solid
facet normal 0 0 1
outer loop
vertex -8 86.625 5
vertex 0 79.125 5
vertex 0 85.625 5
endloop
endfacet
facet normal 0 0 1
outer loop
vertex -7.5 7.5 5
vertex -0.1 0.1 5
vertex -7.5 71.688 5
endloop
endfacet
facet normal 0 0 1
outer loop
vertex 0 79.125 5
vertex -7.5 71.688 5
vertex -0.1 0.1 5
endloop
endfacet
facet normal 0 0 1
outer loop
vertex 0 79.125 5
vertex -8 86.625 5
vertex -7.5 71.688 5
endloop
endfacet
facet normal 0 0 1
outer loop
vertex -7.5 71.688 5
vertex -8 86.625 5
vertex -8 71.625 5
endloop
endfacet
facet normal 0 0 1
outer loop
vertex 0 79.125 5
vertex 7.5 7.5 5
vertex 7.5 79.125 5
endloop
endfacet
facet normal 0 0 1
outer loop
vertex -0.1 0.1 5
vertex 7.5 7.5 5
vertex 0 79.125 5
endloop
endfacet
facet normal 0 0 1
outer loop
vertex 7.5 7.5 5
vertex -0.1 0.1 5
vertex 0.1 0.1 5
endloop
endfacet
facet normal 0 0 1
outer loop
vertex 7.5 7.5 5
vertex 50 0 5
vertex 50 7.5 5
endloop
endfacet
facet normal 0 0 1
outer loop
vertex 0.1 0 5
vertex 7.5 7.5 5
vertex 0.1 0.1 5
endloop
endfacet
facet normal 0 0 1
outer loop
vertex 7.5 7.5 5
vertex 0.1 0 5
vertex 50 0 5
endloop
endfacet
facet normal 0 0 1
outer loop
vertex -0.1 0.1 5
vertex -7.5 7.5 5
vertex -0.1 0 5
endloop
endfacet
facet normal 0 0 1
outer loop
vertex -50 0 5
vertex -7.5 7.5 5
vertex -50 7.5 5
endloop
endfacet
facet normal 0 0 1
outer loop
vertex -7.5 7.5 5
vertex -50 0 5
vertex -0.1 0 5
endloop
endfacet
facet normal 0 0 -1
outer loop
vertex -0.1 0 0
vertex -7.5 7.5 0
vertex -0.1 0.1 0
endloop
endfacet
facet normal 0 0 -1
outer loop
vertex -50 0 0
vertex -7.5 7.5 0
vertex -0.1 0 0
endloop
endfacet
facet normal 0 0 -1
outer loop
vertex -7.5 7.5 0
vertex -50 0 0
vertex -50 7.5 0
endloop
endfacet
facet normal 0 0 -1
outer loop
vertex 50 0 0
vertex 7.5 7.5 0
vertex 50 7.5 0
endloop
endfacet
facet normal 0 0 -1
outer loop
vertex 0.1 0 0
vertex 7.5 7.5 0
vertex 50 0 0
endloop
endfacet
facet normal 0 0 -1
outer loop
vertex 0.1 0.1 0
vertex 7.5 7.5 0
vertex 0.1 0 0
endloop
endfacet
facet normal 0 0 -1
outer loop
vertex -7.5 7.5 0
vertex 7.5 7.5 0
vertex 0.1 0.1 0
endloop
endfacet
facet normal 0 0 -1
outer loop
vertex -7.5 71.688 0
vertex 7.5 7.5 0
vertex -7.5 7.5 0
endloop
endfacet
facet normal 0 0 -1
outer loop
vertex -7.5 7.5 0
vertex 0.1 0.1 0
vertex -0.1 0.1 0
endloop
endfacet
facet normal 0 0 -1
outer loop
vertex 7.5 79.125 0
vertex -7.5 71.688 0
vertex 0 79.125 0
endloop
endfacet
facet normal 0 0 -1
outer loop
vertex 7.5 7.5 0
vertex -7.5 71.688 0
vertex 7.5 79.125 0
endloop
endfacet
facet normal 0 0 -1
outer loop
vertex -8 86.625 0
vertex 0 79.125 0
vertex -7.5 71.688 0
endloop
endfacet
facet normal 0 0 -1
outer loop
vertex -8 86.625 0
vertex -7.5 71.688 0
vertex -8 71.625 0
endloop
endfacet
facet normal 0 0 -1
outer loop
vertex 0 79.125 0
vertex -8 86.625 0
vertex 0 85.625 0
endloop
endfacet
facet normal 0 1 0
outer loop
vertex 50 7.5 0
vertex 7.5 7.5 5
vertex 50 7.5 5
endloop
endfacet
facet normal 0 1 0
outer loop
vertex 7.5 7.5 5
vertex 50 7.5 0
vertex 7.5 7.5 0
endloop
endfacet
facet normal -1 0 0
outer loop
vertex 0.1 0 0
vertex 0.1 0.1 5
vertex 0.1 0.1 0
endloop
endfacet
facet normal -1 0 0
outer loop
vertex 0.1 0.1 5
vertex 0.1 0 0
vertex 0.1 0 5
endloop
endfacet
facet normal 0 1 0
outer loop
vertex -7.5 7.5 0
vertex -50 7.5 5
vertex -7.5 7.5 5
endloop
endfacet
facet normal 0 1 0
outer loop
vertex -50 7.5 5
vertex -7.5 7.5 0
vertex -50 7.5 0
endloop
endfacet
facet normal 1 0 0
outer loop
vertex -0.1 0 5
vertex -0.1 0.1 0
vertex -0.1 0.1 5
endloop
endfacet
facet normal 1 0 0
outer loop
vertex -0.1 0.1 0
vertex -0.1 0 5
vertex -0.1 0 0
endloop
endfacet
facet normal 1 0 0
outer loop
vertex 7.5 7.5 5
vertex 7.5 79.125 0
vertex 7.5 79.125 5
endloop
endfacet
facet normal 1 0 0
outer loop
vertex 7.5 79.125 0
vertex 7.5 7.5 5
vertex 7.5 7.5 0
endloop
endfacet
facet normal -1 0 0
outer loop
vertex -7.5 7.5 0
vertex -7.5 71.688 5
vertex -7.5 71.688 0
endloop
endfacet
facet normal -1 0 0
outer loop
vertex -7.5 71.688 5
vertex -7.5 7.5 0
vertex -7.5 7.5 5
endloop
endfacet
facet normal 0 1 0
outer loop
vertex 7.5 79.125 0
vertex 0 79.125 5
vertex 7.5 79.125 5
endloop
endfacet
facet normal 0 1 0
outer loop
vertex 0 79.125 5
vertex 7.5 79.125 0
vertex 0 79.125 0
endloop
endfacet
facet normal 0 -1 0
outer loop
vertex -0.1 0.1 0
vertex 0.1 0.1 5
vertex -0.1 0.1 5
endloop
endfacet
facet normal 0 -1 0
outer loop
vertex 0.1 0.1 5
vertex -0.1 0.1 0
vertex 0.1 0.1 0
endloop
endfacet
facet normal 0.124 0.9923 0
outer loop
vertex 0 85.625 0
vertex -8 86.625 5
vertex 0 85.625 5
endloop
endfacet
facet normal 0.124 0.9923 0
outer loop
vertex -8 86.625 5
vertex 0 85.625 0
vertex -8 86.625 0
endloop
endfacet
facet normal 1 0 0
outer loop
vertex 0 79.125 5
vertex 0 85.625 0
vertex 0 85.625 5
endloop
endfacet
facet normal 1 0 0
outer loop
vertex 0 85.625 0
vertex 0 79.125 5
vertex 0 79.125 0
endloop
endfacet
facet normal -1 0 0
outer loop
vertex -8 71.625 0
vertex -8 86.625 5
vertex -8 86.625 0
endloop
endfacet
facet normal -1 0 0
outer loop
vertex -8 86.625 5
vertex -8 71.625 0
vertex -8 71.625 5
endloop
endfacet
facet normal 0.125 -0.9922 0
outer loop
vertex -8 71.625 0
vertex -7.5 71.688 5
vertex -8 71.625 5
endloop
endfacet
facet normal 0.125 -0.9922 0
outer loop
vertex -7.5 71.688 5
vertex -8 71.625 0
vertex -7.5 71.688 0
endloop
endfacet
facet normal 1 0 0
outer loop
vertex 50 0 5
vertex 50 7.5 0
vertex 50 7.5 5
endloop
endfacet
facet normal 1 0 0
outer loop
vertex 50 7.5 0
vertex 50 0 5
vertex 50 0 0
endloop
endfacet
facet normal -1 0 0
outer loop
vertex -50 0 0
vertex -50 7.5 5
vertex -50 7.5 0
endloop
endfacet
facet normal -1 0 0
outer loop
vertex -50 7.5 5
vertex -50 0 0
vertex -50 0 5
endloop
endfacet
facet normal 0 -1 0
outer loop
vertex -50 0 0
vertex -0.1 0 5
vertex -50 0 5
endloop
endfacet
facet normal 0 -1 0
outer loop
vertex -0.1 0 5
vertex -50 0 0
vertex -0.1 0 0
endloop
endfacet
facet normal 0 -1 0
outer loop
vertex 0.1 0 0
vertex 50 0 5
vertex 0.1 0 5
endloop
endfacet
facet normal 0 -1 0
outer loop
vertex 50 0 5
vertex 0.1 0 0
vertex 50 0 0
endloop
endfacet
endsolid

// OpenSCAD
// file: ../src/model_a_cross_brace.scad
// ============================================
// PiCanvas - 모델 A: 십자 보강재
// ============================================

// --- 공통 파라미터 (center_bracket과 동일) ---
bracket_size = 70;
bracket_thickness = 5;

// LCD 디스플레이
lcd_w = 350.66;
lcd_h = 216.25;
lcd_d = 3.2;

// 프레임
frame_bezel = 3;        // 전면 오버랩
frame_wall = 6;         // 프레임 벽 두께
frame_inner_w = lcd_w;
frame_inner_h = lcd_h;
frame_outer_w = lcd_w + frame_wall * 2;
frame_outer_h = lcd_h + frame_wall * 2;

// 십자 보강재
cross_bar_width = 15;     // 바 너비
cross_bar_thickness = bracket_thickness;  // 브라켓과 동일 두께

// 도브테일 파라미터 (center_bracket과 맞춤)
dt_width = 15;
dt_depth = 8;
dt_taper = 1;  // 사다리꼴 기울기

// --- 모듈 ---

// 도브테일 암 (center_bracket 쪽 연결)
module dovetail_female(height) {
    clearance = 0.2;  // 끼워맞춤 여유
    linear_extrude(height = height)
        polygon([
            [-(dt_width/2 - dt_taper) - clearance, 0],
            [(dt_width/2 - dt_taper) + clearance, 0],
            [dt_width/2 + clearance, dt_depth + clearance],
            [-dt_width/2 - clearance, dt_depth + clearance]
        ]);
}

// 프레임 연결용 도브테일 수 (끝단)
module dovetail_male_end() {
    linear_extrude(height = cross_bar_thickness)
        polygon([
            [-dt_width/2 + dt_taper, 0],
            [dt_width/2 - dt_taper, 0],
            [dt_width/2, dt_depth],
            [-dt_width/2, dt_depth]
        ]);
}

// 수평 바 (좌우, X축 방향)
module horizontal_bar() {
    bar_length_half = frame_outer_w / 2 - bracket_size / 2;

    // 오른쪽 바
    module half_bar() {
        difference() {
            translate([0, -cross_bar_width/2, 0])
                cube([bar_length_half, cross_bar_width, cross_bar_thickness]);

            // 중앙 브라켓 도브테일 암 (빼기)
            translate([0, 0, 0])
                rotate([0, 0, -90])
                    translate([-dt_width/2 - 0.1, -dt_depth - 0.1, -0.5])
                        cube([dt_width + 0.2, dt_depth + 0.2, cross_bar_thickness + 1]);
        }

        // 프레임 연결 도브테일 (끝단)
        translate([bar_length_half, 0, 0])
            dovetail_male_end();
    }

    // 오른쪽
    half_bar();

    // 왼쪽 (미러)
    mirror([1, 0, 0])
        half_bar();
}

// 수직 바 (상하, Y축 방향)
module vertical_bar() {
    bar_length_half = frame_outer_h / 2 - bracket_size / 2;

    module half_bar() {
        difference() {
            translate([-cross_bar_width/2, 0, 0])
                cube([cross_bar_width, bar_length_half, cross_bar_thickness]);

            // 중앙 브라켓 도브테일 암 (빼기)
            translate([0, 0, 0])
                rotate([0, 0, 0])
                    translate([-dt_width/2 - 0.1, -dt_depth - 0.1, -0.5])
                        cube([dt_width + 0.2, dt_depth + 0.2, cross_bar_thickness + 1]);
        }

        // 프레임 연결 도브테일 (끝단)
        translate([0, bar_length_half, 0])
            rotate([0, 0, 90])
                dovetail_male_end();
    }

    // 위쪽
    half_bar();

    // 아래쪽 (미러)
    mirror([0, 1, 0])
        half_bar();
}

// --- 메인 ---

module model_a_cross_brace() {
    color("CadetBlue") {
        horizontal_bar();
        vertical_bar();
    }
}

model_a_cross_brace();

// 디버그: 중앙 브라켓 외형 (투명)
%translate([-bracket_size/2, -bracket_size/2, 0])
    cube([bracket_size, bracket_size, bracket_thickness]);

// 디버그: 프레임 외형 (투명)
%translate([-frame_outer_w/2, -frame_outer_h/2, 0])
    difference() {
        cube([frame_outer_w, frame_outer_h, 1]);
        translate([frame_wall, frame_wall, -0.5])
            cube([frame_inner_w, frame_inner_h, 2]);
    }
// main file
// ============================================
// Plate 4: 십자 보강재 - 수직 상단 반쪽
// 크기: 15 x ~79 mm (OK)
// ============================================
use <../src/model_a_cross_brace.scad>

lcd_h = 216.25;
frame_wall = 6;
frame_outer_h = lcd_h + frame_wall * 2;

intersection() {
    model_a_cross_brace();
    translate([-50, 0, -1])
        cube([100, frame_outer_h, 20]);
}
